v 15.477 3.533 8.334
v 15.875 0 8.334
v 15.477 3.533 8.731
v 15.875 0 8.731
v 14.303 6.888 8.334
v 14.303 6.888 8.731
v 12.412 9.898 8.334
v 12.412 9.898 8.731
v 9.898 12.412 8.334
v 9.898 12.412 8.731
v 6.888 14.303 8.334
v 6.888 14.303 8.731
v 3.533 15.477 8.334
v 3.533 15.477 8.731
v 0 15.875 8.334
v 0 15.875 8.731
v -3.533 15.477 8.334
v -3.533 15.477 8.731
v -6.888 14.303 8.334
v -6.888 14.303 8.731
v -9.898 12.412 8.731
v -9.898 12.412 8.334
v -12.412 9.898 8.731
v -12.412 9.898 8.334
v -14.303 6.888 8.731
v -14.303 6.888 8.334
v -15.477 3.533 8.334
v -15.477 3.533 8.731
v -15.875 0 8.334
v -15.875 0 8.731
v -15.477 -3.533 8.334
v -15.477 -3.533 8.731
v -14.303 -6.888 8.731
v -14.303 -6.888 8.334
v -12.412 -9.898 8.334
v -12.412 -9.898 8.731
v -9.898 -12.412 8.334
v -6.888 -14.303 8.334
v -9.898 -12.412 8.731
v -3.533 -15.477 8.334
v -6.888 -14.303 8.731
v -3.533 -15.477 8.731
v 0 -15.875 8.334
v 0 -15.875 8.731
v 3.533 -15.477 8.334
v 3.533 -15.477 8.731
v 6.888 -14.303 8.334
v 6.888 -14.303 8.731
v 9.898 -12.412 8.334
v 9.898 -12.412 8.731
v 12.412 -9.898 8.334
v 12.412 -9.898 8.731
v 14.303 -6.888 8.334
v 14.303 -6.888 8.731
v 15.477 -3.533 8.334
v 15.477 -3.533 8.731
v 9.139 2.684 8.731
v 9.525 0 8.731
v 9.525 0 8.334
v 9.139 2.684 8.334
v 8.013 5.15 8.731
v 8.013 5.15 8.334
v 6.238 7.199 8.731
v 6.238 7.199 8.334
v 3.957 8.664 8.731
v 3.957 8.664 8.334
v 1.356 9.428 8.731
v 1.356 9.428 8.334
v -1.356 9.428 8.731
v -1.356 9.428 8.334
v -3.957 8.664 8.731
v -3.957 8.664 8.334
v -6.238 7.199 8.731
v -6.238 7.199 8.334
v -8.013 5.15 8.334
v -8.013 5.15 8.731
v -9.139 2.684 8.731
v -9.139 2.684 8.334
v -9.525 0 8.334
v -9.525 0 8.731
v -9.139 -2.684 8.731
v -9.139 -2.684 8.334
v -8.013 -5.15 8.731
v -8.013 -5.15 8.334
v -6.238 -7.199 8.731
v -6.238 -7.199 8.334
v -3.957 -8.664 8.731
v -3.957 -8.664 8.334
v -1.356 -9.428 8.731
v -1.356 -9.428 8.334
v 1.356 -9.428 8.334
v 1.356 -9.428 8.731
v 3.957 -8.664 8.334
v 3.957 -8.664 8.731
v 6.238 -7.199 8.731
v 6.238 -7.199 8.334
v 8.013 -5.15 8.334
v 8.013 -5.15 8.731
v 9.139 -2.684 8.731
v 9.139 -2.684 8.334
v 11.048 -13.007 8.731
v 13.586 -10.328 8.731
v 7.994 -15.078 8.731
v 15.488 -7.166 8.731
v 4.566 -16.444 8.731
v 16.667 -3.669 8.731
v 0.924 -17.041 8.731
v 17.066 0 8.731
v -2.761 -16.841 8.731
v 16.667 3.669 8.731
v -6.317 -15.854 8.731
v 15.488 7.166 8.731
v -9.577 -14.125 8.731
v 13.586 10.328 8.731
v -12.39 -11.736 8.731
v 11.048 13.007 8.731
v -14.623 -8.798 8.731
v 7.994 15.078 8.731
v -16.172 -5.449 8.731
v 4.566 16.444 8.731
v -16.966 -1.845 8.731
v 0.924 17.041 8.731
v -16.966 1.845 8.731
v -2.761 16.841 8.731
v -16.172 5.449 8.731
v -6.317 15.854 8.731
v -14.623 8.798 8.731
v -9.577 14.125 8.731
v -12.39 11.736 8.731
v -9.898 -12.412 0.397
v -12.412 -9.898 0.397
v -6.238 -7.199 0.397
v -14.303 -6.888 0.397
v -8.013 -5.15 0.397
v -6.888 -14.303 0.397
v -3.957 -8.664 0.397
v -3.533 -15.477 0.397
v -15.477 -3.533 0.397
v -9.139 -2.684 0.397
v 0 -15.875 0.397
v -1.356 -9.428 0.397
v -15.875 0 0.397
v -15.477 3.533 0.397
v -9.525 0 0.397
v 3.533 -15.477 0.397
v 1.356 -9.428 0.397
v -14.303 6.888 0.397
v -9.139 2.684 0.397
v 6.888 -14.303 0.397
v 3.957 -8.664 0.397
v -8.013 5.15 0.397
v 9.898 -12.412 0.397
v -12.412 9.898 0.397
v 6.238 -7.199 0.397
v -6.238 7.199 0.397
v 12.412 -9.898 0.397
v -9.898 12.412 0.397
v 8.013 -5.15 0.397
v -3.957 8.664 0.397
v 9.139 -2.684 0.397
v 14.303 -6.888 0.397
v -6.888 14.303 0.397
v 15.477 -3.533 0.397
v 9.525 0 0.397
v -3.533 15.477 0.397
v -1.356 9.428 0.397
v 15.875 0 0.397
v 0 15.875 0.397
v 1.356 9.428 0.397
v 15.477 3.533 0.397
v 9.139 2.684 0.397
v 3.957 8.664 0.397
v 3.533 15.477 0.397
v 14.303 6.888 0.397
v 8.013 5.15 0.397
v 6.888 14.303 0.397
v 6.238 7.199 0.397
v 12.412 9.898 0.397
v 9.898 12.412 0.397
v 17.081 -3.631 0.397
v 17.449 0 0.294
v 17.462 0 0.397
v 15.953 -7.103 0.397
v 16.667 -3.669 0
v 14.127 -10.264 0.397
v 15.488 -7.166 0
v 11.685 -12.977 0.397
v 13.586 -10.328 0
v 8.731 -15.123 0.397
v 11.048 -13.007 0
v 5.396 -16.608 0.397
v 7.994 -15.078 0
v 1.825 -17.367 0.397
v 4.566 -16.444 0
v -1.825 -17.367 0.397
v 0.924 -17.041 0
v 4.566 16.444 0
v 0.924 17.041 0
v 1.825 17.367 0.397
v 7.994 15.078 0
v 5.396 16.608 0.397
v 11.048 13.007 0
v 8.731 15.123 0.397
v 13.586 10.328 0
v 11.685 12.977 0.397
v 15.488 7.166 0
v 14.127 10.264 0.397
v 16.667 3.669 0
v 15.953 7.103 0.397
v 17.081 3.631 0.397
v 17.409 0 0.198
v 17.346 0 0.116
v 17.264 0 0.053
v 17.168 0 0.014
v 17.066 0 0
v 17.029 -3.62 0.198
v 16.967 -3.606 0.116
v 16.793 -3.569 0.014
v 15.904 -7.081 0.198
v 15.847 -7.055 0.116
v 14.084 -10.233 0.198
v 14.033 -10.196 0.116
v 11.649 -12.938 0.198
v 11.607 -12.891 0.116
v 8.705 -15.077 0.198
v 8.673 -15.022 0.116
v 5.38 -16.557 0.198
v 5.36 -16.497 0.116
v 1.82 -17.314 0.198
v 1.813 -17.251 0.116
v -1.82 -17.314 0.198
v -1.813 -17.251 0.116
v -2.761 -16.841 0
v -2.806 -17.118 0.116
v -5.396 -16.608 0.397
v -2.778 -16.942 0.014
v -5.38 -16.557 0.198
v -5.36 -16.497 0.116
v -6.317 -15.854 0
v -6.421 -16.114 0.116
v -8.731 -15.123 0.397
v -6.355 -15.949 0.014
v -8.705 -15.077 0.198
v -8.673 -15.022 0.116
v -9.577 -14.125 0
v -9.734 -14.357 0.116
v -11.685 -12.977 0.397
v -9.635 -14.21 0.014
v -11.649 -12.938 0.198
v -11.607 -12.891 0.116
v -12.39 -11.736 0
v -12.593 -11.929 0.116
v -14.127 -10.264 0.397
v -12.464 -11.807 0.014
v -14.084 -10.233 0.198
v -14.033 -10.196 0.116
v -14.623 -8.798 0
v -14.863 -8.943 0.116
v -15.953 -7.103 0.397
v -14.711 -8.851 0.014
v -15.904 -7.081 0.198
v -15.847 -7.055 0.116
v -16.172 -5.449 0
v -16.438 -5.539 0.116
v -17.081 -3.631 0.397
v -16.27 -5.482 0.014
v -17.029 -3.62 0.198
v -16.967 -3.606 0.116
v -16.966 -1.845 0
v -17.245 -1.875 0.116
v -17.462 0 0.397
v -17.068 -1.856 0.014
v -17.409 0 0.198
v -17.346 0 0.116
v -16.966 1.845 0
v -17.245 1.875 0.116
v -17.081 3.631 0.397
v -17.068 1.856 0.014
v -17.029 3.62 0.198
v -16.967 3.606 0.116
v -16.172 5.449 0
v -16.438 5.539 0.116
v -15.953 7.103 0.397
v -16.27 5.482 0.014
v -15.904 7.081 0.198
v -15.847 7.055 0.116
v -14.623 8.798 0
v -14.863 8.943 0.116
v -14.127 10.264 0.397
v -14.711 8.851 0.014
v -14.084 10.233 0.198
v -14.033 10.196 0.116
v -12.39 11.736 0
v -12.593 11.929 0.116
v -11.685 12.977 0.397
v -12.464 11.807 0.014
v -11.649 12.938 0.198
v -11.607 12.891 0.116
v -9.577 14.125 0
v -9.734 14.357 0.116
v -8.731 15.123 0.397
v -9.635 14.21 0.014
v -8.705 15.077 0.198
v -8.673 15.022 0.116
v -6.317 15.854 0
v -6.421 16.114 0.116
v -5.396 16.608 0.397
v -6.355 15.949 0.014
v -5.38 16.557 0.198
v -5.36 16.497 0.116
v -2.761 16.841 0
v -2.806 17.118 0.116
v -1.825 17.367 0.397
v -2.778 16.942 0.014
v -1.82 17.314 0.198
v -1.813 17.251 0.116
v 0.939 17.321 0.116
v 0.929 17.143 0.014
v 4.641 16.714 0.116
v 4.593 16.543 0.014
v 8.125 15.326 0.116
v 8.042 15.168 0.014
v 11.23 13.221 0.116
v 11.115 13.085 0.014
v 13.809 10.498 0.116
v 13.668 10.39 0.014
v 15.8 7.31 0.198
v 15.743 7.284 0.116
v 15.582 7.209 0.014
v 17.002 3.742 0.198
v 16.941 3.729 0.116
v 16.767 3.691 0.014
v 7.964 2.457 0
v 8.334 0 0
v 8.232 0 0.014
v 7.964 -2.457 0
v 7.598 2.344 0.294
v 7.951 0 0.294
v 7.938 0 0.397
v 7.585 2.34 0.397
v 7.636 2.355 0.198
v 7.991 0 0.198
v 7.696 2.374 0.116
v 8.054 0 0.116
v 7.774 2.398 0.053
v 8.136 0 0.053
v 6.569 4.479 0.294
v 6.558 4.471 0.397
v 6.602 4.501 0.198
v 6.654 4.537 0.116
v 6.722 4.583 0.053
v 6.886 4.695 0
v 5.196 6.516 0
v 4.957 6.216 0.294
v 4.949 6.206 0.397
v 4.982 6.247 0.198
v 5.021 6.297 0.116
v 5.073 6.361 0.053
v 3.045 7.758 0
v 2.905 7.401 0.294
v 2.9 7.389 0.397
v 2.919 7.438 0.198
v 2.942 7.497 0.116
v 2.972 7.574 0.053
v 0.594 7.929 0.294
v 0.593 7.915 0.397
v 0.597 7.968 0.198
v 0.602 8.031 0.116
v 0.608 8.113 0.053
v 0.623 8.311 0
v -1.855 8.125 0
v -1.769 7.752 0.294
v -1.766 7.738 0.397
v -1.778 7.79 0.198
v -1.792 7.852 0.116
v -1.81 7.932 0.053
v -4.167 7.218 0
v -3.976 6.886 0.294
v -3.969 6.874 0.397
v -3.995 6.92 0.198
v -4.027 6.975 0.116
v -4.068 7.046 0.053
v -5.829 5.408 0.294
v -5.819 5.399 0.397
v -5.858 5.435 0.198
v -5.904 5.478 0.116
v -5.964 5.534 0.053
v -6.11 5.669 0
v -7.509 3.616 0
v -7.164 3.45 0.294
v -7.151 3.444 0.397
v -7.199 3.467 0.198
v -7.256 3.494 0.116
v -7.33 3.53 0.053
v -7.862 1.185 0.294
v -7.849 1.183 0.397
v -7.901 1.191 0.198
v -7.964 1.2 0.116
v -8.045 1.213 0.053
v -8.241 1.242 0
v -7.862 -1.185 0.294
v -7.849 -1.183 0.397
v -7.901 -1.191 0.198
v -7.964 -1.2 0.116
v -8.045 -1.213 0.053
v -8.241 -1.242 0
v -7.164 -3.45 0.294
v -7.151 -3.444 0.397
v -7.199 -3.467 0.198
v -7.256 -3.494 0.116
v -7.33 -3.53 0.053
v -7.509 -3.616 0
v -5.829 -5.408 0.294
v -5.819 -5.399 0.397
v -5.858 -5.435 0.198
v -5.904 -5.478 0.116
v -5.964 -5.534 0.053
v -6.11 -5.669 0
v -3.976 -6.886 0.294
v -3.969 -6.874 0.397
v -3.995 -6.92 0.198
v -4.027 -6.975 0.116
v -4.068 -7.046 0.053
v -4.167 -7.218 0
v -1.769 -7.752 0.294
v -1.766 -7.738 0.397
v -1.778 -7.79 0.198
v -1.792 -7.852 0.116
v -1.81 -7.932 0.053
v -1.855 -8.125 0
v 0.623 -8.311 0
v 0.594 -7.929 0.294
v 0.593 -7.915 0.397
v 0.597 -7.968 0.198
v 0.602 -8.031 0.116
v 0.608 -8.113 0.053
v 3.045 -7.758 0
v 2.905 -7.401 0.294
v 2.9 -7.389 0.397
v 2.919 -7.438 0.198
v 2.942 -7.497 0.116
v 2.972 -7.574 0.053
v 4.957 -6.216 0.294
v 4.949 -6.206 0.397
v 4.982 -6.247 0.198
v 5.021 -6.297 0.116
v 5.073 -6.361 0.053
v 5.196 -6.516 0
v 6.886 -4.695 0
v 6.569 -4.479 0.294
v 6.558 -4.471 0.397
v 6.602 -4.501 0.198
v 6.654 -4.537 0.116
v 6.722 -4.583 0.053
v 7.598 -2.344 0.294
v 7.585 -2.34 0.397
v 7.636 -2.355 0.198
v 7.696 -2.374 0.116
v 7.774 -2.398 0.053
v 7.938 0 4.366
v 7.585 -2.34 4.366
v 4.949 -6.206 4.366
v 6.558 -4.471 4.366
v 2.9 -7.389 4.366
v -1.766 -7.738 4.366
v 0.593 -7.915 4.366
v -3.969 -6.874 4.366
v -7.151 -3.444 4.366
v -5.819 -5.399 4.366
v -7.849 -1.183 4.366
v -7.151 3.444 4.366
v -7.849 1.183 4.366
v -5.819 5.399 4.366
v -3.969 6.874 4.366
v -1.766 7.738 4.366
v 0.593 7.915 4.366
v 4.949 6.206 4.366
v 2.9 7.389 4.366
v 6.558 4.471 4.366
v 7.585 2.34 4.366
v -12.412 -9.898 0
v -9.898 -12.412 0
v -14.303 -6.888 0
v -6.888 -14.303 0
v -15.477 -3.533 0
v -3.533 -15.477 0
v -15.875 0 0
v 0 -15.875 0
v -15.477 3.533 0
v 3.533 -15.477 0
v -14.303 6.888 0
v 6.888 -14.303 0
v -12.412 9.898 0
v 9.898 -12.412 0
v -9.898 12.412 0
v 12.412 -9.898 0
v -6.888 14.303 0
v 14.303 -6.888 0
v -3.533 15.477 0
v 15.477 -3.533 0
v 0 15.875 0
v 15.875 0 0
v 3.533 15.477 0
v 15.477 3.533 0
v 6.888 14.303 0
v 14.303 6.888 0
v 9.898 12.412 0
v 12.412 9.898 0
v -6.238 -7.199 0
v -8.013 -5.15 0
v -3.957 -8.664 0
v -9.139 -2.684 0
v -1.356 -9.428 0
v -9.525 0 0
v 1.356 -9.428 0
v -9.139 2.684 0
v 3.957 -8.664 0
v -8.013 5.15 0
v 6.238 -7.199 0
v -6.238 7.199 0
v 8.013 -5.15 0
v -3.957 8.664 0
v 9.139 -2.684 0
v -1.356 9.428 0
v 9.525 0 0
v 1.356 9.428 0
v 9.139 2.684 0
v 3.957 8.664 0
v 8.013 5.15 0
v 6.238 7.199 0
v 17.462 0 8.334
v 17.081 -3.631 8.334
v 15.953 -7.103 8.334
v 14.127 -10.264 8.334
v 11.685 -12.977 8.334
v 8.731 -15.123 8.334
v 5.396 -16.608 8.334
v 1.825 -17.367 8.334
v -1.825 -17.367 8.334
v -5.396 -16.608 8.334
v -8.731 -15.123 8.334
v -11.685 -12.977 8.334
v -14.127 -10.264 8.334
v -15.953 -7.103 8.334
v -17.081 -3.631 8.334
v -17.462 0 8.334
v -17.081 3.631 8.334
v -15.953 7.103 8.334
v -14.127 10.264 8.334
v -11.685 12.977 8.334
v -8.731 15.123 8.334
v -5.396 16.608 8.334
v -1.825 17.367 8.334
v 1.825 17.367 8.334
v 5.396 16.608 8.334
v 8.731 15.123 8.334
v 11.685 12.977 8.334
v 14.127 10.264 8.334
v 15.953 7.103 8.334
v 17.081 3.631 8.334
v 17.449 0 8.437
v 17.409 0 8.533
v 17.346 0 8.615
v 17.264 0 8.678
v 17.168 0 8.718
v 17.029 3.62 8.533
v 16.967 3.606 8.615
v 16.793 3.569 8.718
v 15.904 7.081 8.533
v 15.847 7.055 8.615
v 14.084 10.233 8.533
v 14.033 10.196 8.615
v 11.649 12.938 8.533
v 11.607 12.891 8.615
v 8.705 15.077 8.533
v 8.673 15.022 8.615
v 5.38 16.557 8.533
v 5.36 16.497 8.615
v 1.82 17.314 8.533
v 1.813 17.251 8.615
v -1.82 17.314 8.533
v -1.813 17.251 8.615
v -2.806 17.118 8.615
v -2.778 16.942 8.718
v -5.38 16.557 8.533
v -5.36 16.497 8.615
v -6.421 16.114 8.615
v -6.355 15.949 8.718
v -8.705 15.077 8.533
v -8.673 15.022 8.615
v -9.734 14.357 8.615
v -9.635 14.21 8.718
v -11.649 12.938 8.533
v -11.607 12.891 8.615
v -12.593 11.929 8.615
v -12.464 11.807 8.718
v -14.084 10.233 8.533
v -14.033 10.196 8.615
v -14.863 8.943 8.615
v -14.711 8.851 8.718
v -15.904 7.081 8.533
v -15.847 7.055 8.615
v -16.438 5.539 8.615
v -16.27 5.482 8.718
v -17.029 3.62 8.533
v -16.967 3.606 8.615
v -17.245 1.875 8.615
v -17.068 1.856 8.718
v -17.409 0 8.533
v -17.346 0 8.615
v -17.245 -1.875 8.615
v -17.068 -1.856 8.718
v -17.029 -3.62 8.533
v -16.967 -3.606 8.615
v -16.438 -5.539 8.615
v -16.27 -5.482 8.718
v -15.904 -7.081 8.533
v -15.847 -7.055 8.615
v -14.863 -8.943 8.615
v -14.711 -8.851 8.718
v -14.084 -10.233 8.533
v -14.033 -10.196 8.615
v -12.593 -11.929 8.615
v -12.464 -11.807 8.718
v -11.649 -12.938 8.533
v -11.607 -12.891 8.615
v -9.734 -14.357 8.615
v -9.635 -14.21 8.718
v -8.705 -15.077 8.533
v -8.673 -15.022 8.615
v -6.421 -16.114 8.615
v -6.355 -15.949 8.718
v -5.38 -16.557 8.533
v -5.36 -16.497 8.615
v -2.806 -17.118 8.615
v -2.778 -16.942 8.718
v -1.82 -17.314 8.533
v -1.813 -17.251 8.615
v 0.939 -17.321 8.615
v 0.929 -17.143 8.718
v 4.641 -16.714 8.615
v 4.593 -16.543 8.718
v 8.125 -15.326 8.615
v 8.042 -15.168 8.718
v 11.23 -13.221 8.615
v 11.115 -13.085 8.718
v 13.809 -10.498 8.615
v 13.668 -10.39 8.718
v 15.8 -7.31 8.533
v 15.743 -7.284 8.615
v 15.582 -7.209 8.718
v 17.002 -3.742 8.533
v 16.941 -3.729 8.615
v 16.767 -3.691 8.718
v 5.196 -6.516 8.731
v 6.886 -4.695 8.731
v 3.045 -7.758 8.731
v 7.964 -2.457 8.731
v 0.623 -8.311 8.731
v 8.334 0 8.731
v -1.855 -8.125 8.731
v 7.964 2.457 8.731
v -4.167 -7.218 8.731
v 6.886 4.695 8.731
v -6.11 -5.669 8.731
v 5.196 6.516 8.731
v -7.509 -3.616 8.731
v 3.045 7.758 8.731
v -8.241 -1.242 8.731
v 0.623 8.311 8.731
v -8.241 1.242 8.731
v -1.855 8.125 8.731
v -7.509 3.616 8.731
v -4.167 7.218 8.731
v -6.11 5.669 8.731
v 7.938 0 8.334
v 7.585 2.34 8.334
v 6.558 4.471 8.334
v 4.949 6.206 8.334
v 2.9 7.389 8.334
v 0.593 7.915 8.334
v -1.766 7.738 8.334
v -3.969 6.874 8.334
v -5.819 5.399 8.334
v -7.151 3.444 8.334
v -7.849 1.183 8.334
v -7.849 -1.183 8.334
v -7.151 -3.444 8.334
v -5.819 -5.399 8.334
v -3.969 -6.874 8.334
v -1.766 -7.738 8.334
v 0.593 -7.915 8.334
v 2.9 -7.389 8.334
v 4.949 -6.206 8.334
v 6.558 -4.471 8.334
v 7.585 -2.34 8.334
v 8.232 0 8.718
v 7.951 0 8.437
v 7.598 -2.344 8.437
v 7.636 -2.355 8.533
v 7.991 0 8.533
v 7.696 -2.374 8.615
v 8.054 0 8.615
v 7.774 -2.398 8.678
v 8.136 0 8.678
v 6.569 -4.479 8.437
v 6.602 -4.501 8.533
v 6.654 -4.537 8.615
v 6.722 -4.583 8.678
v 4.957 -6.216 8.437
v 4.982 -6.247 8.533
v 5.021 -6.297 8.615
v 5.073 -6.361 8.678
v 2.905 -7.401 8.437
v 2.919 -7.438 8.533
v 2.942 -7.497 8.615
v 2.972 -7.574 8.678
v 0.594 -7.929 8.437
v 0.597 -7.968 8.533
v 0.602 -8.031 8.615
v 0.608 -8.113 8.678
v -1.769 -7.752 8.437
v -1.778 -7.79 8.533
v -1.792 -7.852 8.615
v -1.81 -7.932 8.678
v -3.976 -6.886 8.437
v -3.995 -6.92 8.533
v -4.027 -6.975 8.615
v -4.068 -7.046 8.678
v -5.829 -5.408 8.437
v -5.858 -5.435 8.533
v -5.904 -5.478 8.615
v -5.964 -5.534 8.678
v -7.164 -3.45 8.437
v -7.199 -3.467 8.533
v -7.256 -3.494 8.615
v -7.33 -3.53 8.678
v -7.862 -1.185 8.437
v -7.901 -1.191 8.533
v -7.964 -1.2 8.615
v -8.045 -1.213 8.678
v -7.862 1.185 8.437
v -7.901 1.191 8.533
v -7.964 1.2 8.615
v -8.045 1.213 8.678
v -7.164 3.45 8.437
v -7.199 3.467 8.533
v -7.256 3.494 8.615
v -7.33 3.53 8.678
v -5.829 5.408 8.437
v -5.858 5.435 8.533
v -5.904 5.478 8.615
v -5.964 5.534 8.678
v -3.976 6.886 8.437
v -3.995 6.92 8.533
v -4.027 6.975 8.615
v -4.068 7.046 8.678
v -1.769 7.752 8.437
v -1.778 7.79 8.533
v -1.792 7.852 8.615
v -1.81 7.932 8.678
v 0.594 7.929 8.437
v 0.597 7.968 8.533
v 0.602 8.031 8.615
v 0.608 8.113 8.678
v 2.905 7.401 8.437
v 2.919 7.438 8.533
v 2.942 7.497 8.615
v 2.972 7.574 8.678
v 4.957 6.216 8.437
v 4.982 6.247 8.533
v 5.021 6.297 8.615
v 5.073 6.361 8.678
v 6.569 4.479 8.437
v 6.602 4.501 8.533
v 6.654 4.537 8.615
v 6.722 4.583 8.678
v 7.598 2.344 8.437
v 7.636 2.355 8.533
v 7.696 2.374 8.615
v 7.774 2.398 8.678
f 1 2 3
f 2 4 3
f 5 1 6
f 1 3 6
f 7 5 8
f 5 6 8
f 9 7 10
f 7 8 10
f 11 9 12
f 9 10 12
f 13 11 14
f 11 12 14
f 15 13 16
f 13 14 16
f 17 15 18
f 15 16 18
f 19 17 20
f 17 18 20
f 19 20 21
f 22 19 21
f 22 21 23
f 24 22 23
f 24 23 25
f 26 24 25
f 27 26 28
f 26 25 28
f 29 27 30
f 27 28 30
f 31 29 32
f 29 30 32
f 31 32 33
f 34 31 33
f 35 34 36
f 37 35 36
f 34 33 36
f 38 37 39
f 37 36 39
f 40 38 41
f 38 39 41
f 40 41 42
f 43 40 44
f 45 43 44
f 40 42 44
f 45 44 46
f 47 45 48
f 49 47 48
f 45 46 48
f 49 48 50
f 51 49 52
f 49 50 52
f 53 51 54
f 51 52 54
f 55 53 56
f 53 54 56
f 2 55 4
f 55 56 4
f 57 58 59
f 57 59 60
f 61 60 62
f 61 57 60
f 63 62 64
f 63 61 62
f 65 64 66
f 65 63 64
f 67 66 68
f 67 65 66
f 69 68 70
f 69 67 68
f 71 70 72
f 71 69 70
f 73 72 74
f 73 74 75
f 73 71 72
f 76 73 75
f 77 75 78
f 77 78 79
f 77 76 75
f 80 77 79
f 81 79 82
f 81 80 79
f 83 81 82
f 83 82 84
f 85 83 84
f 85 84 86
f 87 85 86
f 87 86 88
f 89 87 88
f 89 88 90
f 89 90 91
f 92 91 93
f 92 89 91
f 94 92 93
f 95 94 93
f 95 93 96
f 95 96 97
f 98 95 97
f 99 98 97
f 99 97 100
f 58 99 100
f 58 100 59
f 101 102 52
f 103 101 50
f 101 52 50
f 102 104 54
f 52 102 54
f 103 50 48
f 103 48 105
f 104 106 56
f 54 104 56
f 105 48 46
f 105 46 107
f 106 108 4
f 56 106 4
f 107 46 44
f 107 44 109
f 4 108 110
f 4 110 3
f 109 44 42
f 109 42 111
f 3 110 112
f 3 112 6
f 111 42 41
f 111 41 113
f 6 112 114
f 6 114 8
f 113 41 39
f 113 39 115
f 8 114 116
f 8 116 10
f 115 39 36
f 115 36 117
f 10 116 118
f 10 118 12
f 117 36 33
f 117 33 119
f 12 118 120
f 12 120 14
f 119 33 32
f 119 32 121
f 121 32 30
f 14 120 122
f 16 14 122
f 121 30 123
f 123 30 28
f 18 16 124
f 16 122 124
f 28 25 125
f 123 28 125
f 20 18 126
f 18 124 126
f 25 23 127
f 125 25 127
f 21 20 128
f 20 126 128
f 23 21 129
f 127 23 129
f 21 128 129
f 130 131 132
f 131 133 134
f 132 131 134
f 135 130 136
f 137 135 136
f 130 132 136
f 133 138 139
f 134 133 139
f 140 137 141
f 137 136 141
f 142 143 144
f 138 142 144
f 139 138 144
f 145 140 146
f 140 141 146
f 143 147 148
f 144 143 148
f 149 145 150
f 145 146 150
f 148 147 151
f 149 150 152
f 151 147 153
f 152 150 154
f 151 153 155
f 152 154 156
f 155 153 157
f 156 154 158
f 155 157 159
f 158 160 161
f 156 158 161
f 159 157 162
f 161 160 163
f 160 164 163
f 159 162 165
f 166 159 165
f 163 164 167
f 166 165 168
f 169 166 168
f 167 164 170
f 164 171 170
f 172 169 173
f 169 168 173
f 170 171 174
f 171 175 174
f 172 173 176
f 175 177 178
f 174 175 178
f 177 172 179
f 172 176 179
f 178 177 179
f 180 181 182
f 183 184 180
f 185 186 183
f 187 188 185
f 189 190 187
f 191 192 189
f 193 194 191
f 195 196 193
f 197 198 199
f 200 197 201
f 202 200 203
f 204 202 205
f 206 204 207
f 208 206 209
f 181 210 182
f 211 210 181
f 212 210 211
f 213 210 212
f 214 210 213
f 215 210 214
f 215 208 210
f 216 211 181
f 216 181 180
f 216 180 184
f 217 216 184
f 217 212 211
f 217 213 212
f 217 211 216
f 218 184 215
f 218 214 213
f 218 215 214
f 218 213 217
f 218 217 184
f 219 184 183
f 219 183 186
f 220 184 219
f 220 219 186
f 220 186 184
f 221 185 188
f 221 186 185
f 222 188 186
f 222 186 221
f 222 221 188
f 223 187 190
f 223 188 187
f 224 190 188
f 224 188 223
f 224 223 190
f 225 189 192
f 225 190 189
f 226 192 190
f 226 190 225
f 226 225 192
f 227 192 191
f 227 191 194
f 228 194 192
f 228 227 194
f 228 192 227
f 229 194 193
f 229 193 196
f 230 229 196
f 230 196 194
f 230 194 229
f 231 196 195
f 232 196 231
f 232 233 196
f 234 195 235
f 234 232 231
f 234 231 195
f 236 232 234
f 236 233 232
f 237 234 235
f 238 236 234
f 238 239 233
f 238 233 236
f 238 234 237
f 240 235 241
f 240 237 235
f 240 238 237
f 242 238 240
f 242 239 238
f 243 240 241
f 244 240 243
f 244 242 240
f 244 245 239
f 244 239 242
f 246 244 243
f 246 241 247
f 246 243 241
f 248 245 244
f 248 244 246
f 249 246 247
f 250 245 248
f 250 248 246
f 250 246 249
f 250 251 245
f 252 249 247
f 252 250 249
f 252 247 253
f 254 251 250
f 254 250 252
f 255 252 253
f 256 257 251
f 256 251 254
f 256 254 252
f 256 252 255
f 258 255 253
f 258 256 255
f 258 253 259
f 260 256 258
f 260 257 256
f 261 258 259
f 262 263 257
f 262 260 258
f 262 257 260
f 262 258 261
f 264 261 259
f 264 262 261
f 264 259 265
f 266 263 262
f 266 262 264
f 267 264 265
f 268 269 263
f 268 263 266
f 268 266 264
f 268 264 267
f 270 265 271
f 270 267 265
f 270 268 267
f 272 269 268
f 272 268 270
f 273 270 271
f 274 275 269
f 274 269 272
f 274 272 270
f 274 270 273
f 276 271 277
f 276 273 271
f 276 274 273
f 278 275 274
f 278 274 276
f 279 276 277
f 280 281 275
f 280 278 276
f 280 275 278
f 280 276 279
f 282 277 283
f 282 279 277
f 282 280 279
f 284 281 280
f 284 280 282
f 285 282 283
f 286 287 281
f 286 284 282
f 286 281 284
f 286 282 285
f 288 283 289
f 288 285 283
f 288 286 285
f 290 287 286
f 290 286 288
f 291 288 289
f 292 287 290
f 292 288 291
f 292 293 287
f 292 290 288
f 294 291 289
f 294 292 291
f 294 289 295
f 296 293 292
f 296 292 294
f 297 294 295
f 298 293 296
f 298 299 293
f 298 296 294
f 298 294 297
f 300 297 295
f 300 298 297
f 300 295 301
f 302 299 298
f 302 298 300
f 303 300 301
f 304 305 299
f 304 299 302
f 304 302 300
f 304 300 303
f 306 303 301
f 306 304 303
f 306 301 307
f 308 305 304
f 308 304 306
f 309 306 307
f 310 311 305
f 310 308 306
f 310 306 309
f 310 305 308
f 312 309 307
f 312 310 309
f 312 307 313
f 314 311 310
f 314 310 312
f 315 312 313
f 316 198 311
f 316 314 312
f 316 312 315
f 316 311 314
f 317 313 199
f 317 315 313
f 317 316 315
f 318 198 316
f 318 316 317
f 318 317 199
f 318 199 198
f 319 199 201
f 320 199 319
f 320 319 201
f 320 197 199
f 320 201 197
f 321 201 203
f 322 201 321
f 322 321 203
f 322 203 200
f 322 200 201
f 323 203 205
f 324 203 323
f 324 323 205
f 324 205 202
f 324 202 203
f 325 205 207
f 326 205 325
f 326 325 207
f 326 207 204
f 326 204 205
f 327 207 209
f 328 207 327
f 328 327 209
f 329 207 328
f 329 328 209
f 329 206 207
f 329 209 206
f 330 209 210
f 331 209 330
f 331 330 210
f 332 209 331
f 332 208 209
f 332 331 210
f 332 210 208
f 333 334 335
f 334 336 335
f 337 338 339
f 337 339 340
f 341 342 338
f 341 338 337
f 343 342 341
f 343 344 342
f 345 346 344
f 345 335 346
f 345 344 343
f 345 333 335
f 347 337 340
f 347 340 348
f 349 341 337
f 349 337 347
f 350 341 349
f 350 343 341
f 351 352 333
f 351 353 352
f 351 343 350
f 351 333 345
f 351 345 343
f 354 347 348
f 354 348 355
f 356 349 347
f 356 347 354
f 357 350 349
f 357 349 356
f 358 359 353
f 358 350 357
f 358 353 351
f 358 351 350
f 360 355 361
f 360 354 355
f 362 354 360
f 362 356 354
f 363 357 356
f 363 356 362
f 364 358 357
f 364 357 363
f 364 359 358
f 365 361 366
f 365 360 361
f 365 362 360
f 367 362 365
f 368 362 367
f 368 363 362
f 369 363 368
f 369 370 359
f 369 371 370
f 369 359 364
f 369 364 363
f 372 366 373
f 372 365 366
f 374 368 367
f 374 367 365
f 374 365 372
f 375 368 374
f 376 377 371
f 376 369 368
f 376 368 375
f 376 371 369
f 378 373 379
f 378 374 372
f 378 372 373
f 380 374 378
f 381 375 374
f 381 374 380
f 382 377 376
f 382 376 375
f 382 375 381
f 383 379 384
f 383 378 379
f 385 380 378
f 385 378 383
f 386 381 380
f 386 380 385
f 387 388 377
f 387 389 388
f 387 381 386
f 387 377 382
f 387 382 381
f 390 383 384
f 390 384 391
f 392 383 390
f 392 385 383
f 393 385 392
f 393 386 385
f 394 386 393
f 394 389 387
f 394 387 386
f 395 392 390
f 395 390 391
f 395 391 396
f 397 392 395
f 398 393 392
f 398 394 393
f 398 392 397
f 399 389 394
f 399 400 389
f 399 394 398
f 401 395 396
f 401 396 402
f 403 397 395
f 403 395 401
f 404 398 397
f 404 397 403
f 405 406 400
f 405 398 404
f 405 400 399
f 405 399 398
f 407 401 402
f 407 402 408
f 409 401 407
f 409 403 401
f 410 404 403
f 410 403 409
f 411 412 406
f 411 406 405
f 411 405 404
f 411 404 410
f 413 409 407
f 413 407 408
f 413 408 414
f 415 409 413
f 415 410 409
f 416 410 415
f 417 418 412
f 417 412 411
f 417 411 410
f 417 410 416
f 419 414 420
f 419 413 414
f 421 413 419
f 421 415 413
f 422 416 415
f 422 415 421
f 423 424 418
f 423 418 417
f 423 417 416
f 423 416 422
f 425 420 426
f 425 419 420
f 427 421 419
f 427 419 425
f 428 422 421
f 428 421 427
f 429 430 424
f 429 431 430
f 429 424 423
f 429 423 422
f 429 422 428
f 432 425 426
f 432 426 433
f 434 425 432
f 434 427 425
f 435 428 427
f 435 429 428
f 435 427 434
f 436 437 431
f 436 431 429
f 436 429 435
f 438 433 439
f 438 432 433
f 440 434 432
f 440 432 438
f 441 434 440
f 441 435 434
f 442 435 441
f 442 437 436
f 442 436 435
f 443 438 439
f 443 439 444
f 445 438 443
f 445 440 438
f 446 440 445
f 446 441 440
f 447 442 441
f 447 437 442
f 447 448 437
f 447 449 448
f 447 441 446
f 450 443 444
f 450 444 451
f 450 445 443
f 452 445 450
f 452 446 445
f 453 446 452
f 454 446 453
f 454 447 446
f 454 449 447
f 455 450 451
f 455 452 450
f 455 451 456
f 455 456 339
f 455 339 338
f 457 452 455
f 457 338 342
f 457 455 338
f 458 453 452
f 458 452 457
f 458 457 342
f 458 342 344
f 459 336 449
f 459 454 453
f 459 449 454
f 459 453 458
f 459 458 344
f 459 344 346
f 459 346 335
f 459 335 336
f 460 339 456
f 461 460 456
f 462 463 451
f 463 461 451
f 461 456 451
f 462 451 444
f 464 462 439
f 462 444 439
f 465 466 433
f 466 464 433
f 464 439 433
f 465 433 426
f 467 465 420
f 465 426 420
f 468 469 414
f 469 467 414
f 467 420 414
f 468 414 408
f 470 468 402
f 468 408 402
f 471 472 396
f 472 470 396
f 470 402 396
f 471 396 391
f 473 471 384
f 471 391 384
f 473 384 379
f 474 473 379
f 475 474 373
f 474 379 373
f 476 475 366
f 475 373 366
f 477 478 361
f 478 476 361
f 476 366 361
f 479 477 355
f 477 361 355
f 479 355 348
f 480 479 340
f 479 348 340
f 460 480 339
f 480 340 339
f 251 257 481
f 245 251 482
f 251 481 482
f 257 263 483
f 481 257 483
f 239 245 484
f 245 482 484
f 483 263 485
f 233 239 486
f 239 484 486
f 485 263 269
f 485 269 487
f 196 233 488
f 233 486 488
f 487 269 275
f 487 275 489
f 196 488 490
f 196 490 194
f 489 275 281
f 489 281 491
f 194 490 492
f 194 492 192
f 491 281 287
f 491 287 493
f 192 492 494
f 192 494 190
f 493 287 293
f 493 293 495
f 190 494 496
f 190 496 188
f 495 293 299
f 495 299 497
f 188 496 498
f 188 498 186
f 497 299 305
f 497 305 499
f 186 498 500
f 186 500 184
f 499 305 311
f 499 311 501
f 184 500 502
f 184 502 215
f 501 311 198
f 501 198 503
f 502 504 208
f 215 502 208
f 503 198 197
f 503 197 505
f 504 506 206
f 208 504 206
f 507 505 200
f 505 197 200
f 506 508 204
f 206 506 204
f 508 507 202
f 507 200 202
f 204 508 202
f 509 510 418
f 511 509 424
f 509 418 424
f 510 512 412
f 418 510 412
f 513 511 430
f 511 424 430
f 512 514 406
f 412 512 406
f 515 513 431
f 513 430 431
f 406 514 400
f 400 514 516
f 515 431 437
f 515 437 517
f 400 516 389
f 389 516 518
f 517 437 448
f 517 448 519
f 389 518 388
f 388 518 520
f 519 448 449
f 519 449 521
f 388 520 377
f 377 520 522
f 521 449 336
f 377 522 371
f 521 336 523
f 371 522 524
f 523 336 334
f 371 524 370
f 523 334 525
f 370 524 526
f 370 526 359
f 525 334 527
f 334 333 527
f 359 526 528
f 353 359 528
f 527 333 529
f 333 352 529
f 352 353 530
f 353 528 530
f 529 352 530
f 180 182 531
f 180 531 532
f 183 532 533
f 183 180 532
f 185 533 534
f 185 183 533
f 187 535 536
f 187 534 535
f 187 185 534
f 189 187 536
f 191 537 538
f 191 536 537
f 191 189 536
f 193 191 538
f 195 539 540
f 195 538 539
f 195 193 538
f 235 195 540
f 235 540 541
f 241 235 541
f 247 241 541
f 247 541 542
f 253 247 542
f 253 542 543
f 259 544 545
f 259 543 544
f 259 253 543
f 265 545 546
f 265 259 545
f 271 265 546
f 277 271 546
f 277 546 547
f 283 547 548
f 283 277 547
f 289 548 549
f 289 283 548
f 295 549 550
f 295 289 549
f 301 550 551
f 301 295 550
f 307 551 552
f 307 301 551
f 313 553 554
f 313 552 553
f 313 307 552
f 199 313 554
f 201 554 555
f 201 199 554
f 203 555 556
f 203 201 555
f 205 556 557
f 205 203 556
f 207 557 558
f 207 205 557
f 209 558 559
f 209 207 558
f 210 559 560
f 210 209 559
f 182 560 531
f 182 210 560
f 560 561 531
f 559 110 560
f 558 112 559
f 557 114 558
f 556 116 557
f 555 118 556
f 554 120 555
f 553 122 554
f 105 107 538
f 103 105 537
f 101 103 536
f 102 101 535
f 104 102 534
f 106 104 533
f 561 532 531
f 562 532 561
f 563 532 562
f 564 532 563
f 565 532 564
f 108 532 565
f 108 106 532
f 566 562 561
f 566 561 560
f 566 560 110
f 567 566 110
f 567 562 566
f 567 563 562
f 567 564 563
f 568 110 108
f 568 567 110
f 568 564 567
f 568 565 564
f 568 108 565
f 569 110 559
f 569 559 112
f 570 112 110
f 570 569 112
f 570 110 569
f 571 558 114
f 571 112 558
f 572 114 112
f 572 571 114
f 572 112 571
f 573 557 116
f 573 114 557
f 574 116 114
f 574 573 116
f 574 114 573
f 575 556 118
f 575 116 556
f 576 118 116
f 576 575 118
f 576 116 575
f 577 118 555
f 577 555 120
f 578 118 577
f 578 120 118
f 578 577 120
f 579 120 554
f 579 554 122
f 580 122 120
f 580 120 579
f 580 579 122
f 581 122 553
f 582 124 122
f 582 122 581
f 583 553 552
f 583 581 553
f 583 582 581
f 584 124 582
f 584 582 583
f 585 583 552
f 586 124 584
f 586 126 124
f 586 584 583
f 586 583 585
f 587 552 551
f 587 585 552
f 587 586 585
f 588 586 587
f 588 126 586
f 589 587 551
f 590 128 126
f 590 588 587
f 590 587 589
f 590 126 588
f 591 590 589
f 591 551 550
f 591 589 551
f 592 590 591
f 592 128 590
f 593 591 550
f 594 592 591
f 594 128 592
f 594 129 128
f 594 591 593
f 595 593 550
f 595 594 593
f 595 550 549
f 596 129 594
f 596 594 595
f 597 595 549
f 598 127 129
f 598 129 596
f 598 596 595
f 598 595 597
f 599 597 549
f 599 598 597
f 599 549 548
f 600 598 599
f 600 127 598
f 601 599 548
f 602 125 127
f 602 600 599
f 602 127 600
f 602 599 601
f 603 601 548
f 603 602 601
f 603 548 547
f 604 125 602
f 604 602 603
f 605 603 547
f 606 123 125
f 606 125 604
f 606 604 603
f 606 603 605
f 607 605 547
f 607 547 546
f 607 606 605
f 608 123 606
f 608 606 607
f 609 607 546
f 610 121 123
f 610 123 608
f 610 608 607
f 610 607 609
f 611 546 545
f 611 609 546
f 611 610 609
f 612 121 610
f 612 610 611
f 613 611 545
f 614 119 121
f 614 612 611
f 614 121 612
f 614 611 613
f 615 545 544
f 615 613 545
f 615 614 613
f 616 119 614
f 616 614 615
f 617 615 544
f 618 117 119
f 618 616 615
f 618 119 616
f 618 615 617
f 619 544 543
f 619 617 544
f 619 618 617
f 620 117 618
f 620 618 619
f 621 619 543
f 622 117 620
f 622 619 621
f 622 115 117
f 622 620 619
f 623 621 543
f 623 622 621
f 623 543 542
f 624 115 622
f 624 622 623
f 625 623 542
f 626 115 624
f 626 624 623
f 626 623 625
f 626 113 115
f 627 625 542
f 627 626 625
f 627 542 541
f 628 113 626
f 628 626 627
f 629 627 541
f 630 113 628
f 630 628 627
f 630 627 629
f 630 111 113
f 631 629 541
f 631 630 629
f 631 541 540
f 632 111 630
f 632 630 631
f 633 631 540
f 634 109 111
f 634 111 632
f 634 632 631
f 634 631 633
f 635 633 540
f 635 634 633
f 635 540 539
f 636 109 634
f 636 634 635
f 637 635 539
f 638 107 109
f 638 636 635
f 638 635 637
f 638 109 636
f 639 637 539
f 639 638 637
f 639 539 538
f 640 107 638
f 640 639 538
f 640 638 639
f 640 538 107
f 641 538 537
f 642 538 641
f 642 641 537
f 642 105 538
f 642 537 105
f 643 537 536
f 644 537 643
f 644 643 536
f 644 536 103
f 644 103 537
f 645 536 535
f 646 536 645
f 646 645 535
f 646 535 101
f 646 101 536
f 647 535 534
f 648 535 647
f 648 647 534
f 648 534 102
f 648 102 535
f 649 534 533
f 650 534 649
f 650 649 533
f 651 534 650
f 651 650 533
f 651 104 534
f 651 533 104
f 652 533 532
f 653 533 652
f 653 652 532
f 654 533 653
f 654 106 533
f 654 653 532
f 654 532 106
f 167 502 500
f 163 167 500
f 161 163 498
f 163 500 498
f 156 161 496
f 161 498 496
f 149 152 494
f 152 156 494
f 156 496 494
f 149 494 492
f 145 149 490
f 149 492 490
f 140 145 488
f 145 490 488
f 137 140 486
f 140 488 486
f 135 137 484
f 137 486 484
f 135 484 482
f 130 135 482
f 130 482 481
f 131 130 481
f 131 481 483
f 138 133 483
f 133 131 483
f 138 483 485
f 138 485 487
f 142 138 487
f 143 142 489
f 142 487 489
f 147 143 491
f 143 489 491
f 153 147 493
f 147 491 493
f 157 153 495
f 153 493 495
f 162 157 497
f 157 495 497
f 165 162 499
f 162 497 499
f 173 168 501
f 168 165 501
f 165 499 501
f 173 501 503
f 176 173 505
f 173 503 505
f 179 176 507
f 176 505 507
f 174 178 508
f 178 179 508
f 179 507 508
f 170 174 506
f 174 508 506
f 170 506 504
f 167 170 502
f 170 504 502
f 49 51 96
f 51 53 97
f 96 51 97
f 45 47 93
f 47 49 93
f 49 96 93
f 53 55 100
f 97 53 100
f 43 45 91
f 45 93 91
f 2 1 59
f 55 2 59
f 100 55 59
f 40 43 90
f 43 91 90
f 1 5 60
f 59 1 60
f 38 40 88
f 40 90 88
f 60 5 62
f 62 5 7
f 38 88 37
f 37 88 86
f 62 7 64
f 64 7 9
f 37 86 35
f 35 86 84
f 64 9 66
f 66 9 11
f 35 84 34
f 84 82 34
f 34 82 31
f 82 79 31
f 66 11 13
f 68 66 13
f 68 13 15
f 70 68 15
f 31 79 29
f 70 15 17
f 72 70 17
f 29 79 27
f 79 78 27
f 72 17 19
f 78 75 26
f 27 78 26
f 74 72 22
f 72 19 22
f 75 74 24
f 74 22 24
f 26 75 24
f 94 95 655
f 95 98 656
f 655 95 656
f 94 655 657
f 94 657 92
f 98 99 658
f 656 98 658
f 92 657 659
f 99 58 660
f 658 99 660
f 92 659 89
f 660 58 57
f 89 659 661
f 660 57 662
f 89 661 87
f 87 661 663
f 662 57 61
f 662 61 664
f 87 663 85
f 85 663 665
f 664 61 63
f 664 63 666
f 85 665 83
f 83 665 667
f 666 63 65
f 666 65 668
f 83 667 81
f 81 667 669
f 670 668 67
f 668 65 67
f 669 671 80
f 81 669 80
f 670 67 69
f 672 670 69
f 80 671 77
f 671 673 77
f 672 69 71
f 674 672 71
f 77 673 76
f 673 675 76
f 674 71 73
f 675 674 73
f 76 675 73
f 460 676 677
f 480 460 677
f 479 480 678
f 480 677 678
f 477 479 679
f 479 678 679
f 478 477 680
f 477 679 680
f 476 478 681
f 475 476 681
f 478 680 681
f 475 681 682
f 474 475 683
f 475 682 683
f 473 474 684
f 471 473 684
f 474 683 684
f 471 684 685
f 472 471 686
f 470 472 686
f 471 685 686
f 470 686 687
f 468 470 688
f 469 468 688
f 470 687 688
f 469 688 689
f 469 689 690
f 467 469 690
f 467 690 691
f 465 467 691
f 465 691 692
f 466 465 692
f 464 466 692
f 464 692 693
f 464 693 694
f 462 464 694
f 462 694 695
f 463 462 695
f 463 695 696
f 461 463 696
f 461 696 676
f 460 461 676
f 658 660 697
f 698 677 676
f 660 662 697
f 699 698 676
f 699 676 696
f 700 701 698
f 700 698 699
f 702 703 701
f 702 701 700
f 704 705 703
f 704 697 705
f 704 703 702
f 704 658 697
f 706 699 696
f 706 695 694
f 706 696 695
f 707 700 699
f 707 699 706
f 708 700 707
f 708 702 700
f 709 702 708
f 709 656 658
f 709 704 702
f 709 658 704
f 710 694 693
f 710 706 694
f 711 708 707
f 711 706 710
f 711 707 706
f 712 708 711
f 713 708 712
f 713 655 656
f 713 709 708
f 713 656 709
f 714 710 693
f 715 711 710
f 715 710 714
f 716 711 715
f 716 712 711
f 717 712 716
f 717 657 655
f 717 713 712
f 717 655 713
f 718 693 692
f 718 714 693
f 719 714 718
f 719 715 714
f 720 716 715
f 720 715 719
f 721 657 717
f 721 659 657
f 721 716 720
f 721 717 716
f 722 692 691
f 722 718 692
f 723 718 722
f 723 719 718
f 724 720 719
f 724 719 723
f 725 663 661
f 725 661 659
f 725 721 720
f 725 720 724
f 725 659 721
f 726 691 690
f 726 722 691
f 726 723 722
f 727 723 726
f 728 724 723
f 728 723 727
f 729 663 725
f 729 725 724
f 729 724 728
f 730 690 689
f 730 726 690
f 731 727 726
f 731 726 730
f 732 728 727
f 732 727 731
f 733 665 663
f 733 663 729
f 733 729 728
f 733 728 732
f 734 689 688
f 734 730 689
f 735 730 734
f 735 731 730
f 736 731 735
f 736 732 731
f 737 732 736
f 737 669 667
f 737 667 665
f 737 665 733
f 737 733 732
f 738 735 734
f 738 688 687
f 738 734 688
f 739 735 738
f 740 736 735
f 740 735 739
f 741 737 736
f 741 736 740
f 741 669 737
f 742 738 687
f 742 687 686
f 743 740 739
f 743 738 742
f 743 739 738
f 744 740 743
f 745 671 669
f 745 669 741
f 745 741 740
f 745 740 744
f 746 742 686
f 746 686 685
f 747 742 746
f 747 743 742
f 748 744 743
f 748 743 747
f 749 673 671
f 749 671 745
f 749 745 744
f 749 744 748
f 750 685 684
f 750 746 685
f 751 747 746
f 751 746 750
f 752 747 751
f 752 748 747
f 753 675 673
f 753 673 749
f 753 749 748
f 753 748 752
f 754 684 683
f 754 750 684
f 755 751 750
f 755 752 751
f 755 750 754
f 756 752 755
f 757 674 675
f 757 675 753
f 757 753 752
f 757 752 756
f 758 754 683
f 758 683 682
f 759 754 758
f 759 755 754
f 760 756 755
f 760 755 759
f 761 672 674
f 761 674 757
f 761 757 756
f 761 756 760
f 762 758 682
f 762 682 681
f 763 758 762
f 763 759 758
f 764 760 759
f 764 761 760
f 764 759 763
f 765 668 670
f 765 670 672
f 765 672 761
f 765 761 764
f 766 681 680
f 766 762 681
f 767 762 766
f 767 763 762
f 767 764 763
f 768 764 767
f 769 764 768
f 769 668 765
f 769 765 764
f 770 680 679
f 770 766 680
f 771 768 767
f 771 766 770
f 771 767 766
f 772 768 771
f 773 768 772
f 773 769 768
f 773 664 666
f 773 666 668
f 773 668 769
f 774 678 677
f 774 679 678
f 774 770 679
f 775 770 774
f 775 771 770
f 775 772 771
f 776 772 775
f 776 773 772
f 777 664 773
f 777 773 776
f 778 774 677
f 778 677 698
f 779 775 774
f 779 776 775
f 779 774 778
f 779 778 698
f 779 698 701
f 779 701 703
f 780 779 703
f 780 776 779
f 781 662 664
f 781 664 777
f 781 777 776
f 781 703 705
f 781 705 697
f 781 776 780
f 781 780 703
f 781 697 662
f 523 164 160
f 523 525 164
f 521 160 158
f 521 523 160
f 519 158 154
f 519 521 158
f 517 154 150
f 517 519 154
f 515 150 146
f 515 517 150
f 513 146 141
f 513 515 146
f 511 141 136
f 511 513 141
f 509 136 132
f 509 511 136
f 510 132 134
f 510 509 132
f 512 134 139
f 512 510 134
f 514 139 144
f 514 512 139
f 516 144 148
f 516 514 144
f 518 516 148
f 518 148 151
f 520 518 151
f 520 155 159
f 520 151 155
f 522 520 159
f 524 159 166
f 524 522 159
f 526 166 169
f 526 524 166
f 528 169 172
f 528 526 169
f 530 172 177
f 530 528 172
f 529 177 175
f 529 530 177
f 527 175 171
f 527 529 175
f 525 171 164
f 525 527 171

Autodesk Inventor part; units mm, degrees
ref_plane "YZ Plane" through (0, 0, 0) normal (1, 0, 0) x (0, 1, 0)
ref_plane "XZ Plane" through (0, 0, 0) normal (0, 1, 0) x (-1, 0, 0)
ref_plane "XY Plane" through (0, 0, 0) normal (0, 0, 1) x (1, 0, 0)
sketch "Sketch1" plane through (0, 0, 0) normal (0, 0, 1) x (1, 0, 0)
  circle A0 centre (0, 0) radius 17.4625
  circle A1 centre (0, 0) radius 15.875
  circle A2 centre (0, 0) radius 7.9375
  circle A3 centre (0, 0) radius 9.525
  dimension "d0" = 34.925
  dimension "d2" = 31.75
  dimension "d3" = 15.875
  dimension "d4" = 19.05
extrude "Extrusion1" add sketch "Sketch1" along normal blind 4.3656 contours A0 | A1 | A3
extrude "Extrusion2" cut sketch "Sketch1" along normal blind 0.3969 contours A1
fillet "Fillet1" radius 0.3969 2 edges at (-17.4625, 0, 0) (-7.9375, 0, 0)
mirror "Mirror1" about plane through (0, 0, 4.3656) normal (0, 0, 1)
properties part number "R10-2RS"
